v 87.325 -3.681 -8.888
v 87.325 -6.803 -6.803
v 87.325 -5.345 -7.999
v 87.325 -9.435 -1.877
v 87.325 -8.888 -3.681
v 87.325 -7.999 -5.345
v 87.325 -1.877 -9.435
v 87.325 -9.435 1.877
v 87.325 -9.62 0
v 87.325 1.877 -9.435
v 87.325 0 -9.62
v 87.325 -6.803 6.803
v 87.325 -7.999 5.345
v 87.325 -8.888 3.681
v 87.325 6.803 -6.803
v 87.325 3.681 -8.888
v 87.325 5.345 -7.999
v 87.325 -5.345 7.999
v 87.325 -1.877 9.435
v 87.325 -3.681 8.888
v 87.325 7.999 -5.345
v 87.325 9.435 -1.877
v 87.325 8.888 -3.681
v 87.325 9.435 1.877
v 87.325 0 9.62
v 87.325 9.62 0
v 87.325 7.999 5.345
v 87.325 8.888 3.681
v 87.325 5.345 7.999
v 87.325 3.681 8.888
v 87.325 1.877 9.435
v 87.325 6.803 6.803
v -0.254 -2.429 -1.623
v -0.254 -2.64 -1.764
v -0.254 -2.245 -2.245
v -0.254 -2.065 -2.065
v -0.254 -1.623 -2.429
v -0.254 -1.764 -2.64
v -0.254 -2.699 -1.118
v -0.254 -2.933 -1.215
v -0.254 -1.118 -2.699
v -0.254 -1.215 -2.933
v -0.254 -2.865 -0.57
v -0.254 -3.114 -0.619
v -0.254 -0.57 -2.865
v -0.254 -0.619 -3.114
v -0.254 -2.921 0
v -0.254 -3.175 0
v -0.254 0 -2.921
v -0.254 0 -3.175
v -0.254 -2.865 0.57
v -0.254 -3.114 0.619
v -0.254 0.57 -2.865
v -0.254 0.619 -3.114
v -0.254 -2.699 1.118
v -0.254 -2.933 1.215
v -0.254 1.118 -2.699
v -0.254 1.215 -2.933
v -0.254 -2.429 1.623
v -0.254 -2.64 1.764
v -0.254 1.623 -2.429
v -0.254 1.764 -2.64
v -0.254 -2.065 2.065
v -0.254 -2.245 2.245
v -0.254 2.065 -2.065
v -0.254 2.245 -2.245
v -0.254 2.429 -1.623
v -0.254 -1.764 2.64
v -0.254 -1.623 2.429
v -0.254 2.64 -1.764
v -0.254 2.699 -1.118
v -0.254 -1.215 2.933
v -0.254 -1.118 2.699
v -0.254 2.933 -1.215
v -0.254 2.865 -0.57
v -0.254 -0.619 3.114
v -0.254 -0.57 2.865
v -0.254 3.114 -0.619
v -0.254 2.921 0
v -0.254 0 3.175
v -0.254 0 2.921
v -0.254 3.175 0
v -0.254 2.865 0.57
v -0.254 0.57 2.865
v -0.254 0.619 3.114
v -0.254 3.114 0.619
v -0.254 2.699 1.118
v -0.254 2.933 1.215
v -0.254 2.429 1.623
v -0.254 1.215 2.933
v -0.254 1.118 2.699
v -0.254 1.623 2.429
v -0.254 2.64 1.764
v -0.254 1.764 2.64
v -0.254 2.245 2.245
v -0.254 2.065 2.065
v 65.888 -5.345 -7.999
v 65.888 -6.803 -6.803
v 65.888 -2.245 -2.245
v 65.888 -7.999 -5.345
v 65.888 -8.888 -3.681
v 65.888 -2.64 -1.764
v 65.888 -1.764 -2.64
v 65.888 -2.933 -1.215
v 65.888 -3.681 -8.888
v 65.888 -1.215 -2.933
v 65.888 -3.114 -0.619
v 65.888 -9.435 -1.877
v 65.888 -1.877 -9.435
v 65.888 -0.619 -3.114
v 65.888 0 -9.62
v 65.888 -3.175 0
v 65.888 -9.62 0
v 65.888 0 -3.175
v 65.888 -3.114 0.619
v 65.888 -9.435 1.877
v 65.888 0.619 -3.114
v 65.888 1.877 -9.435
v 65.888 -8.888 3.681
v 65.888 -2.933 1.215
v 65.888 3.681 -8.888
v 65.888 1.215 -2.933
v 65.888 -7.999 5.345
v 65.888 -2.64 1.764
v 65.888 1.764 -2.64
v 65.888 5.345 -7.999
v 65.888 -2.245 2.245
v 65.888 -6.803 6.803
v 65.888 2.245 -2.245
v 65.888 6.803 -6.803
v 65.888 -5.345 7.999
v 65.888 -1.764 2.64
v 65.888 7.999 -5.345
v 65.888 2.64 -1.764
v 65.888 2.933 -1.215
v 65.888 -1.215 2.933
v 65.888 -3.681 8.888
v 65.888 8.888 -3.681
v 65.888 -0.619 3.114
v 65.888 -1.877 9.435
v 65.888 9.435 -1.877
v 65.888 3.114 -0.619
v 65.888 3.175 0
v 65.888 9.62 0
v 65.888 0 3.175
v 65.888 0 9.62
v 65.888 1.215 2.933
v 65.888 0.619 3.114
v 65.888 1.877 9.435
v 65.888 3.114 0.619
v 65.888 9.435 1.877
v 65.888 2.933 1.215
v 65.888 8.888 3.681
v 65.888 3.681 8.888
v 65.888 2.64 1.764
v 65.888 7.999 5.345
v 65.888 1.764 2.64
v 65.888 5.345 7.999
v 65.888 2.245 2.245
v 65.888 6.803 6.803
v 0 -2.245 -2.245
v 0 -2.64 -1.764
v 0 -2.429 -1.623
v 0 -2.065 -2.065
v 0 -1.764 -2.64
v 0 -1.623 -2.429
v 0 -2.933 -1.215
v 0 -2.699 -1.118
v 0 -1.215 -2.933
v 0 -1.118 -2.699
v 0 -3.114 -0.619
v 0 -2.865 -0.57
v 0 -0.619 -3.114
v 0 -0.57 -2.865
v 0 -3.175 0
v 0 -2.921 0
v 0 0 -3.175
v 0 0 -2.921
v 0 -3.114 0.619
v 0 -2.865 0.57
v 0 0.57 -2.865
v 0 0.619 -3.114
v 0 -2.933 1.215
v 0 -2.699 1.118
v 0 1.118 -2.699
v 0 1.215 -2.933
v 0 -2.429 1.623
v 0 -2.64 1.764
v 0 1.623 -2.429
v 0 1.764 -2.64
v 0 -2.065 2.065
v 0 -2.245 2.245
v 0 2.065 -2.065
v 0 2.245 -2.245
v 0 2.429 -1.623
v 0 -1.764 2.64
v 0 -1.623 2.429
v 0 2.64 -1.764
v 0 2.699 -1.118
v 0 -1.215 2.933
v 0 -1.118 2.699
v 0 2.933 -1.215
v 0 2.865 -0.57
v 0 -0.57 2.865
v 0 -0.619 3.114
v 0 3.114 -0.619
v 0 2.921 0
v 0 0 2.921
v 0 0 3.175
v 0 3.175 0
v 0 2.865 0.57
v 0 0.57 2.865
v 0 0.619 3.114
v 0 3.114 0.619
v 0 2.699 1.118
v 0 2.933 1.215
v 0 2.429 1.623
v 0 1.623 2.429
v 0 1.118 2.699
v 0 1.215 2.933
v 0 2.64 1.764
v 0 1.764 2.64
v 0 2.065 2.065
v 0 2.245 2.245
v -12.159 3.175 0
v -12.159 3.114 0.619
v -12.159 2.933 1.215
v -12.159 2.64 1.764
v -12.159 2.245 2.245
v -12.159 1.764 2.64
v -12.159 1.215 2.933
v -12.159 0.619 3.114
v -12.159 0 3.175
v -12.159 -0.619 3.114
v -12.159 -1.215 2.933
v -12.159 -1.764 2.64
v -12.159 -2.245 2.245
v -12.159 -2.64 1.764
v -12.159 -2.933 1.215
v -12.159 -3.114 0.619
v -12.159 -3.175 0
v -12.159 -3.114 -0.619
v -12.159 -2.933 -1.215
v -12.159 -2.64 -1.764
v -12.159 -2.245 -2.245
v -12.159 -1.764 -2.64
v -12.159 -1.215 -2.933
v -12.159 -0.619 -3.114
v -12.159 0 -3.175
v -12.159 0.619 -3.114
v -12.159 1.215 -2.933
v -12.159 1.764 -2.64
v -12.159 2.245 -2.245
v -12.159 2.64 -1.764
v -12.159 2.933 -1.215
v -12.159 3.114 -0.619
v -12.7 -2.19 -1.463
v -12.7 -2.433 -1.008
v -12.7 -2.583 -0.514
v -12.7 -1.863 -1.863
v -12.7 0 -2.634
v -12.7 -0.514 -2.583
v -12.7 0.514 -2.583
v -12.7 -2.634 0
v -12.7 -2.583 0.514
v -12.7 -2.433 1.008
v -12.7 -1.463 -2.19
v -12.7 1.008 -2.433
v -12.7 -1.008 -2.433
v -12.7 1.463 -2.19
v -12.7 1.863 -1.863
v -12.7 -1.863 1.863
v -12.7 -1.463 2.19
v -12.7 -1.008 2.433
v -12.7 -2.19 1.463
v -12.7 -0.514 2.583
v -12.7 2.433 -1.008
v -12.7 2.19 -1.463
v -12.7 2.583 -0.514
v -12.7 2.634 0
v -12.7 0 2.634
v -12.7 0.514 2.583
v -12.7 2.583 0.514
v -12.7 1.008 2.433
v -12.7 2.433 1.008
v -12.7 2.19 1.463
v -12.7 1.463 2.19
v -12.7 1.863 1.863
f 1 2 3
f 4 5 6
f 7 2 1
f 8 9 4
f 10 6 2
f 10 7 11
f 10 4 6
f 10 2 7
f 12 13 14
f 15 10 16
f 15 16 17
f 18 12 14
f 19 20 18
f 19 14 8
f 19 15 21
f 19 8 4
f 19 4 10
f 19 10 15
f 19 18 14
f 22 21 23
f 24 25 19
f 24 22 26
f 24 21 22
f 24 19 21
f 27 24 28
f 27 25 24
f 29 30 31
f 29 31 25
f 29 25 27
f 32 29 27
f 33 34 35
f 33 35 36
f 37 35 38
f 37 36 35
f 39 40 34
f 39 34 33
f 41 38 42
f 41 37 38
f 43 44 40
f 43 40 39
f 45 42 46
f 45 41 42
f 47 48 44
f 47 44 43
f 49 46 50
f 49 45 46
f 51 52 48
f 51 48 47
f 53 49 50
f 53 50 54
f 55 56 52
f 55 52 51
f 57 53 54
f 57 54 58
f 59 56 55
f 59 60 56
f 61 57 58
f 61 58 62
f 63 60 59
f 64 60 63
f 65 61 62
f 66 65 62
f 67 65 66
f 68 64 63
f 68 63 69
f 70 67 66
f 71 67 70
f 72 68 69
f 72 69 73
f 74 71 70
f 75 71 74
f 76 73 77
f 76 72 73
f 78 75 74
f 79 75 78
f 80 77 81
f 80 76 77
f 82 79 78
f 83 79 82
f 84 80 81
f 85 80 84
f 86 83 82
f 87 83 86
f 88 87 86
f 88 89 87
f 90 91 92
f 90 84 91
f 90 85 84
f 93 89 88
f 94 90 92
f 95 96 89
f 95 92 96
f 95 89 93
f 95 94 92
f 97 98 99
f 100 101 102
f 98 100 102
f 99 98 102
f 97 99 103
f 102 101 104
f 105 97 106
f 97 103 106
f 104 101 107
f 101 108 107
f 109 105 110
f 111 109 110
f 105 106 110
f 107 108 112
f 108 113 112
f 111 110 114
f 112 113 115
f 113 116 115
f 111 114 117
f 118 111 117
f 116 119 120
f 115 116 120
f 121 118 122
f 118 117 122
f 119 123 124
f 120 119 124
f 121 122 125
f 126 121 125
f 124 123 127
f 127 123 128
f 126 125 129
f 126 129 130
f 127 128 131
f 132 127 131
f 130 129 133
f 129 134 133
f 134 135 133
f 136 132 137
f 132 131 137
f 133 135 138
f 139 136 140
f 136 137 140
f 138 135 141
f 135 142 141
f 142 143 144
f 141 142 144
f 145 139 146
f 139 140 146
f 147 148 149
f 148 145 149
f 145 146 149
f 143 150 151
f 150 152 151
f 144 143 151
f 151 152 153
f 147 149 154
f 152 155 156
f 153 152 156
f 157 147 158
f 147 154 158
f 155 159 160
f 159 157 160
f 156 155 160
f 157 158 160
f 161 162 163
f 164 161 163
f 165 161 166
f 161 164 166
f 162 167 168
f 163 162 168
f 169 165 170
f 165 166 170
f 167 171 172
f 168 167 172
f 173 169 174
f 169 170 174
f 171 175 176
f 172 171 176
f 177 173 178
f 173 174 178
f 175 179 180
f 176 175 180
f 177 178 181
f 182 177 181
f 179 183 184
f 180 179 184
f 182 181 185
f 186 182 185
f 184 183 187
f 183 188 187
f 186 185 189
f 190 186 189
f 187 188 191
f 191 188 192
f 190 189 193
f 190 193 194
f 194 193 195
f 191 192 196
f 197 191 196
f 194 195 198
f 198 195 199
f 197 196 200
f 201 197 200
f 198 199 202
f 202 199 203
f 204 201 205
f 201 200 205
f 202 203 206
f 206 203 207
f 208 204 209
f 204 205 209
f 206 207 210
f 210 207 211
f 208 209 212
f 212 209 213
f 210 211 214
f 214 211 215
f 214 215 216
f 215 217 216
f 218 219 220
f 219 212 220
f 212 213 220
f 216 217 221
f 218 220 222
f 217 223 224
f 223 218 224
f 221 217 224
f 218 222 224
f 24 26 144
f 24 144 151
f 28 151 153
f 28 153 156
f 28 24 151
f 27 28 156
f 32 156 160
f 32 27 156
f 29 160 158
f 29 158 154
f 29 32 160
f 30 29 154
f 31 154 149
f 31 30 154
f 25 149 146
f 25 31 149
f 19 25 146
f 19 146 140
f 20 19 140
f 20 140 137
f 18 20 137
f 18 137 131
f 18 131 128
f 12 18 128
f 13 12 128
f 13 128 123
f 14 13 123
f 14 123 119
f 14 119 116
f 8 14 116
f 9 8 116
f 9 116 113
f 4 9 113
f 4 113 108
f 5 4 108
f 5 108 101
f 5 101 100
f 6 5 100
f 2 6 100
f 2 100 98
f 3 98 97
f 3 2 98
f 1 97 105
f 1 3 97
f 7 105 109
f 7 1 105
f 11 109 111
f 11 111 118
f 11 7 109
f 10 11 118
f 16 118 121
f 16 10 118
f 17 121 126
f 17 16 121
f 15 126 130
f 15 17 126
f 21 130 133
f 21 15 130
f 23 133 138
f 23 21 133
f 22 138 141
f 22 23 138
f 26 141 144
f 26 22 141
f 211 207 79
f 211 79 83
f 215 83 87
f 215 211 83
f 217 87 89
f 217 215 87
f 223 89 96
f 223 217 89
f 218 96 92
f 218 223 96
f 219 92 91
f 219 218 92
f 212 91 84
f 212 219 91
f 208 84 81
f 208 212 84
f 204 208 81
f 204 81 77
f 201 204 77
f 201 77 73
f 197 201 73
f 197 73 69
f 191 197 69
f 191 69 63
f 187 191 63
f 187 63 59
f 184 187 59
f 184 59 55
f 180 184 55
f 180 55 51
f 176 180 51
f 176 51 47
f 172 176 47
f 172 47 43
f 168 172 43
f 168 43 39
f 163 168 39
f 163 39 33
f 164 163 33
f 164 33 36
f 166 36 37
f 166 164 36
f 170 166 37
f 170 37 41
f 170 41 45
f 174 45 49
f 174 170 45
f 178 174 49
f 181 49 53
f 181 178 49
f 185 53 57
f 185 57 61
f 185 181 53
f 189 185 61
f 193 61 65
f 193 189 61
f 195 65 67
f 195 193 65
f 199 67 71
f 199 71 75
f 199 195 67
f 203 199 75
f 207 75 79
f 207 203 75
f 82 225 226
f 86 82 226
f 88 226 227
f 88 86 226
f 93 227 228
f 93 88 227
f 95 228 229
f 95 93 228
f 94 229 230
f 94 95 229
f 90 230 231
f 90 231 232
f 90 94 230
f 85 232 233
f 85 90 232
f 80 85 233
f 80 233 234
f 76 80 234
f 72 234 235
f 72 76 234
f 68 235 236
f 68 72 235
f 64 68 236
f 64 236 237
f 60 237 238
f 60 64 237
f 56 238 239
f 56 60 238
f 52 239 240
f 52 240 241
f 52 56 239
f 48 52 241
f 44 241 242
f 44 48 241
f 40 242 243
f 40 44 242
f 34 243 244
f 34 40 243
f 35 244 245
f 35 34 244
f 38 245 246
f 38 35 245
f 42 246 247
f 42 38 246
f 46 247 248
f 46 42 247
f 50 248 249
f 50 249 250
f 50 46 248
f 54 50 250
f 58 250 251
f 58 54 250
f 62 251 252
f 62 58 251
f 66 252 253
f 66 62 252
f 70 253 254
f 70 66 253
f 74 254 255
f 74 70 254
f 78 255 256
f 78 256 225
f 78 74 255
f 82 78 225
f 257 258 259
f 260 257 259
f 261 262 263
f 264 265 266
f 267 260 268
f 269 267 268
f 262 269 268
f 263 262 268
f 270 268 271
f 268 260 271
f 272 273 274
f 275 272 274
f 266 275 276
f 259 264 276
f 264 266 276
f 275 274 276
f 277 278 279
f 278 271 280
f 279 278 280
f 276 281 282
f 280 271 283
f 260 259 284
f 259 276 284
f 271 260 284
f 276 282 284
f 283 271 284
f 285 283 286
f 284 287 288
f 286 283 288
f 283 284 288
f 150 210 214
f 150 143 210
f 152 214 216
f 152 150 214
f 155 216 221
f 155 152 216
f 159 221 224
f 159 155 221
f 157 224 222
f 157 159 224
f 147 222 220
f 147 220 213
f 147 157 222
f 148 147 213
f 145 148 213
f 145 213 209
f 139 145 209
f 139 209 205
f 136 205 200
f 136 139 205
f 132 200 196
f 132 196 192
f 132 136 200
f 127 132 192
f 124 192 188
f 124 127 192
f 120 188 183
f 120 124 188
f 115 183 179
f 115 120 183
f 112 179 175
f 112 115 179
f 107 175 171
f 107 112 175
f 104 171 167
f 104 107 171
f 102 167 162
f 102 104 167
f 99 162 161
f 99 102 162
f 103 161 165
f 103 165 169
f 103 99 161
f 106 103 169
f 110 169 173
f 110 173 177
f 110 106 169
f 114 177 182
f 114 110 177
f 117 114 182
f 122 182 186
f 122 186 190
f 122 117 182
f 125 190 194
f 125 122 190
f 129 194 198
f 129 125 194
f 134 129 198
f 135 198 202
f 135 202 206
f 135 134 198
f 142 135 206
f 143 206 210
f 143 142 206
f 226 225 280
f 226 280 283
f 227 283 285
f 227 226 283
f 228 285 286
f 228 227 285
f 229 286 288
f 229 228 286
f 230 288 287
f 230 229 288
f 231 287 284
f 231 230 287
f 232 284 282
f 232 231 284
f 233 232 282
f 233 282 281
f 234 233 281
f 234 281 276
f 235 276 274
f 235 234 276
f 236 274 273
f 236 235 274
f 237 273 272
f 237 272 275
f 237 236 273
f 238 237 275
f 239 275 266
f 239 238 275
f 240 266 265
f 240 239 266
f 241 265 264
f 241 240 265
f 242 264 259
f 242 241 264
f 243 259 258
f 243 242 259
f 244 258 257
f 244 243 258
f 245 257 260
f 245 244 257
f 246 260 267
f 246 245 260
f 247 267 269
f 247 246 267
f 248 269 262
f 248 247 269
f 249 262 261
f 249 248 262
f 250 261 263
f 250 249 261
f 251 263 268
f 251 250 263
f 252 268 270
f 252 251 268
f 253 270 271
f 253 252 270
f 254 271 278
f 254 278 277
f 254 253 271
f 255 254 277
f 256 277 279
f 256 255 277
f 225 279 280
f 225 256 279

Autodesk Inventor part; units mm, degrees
sketch "Sketch_1" plane through (0, 0, 0) normal (0, 0, 1) x (1, 0, 0)
  line L0 (87.3252, 0) -> (0, 0)
  line L1 (0, 0) -> (0, 3.175)
  line L2 (0, 3.175) -> (65.8876, 3.175)
  line L3 (65.8876, 3.175) -> (65.8876, 9.6202)
  line L4 (65.8876, 9.6202) -> (87.3252, 9.6202)
  line L5 (87.3252, 9.6202) -> (87.3252, 0)
  line L6 (87.3252, 0) -> (0, 0)
revolve "Revolution1" add sketch "Sketch_1" angle 360 about axis through (87.3252, 0, 0) along (1, 0, 0)
sketch "Sketch_3" plane through (0, 0, 0) normal (0, 0, 1) x (1, 0, 0)
  line L0 (0, 0) -> (-12.7, 0)
  line L1 (-12.7, 0) -> (-12.7, 2.634)
  line L2 (-12.7, 2.634) -> (-12.159, 3.175)
  line L3 (-12.159, 3.175) -> (0, 3.175)
  line L4 (0, 3.175) -> (0, 0)
  line L5 (0, 0) -> (-12.7, 0)
revolve "Revolution2" add sketch "Sketch_3" angle 360 about axis through (0, 0, 0) along (1, 0, 0)
sketch "Sketch_30" plane through (0, 0, 0) normal (0, 0, 1) x (1, 0, 0)
  line L0 (0, 0) -> (-0.254, 0)
  line L1 (-0.254, 2.921) -> (0, 2.921)
  line L2 (0, 2.921) -> (0, 3.429)
  line L3 (0, 3.429) -> (-0.254, 3.429)
  line L4 (-0.254, 3.429) -> (-0.254, 2.921)
revolve "Revolution3" cut sketch "Sketch_30" angle 360 about axis through (0, 0, 0) along (1, 0, 0)
ref_plane "dia1_XY" through (0, 3.175, 0) normal (1, 0, 0) x (0, 0, -1)
ref_plane "dia1_YZ" through (0, 3.175, 0) normal (0, 0, -1) x (0, 1, 0)
ref_plane "dia1_ZX" through (0, 3.175, 0) normal (0, 1, 0) x (1, 0, 0)
ref_plane "dia12_XY" through (0, 0, 10.9537) normal (1, 0, 0) x (0, 0, -1)
ref_plane "dia12_YZ" through (0, 0, 10.9537) normal (0, 0, -1) x (0, 1, 0)
ref_plane "dia12_ZX" through (0, 0, 10.9537) normal (0, 1, 0) x (1, 0, 0)
ref_plane "dia2_XY" through (0, -3.175, 0) normal (1, 0, 0) x (0, 0, -1)
ref_plane "dia2_YZ" through (0, -3.175, 0) normal (0, 0, -1) x (0, 1, 0)
ref_plane "dia2_ZX" through (0, -3.175, 0) normal (0, 1, 0) x (1, 0, 0)
ref_plane "dia22_XY" through (0, 0, -10.9537) normal (1, 0, 0) x (0, 0, -1)
ref_plane "dia22_YZ" through (0, 0, -10.9537) normal (0, 0, -1) x (0, 1, 0)
ref_plane "dia22_ZX" through (0, 0, -10.9537) normal (0, 1, 0) x (1, 0, 0)
ref_plane "rl1_XY" through (-12.7, 0, 0) normal (1, 0, 0) x (0, 0, -1)
ref_plane "rl1_YZ" through (-12.7, 0, 0) normal (0, 0, -1) x (0, 1, 0)
ref_plane "rl1_ZX" through (-12.7, 0, 0) normal (0, 1, 0) x (1, 0, 0)
ref_plane "rl2_XY" through (0, 0, 0) normal (1, 0, 0) x (0, 0, -1)
ref_plane "rl2_YZ" through (0, 0, 0) normal (0, 0, -1) x (0, 1, 0)
ref_plane "rl2_ZX" through (0, 0, 0) normal (0, 1, 0) x (1, 0, 0)
ref_plane "rod_cp_XY" through (0, 0, 0) normal (1, 0, 0) x (0, 0, -1)
ref_plane "rod_cp_YZ" through (0, 0, 0) normal (0, 0, -1) x (0, 1, 0)
ref_plane "rod_cp_ZX" through (0, 0, 0) normal (0, 1, 0) x (1, 0, 0)
ref_plane "thd1_XY" through (-12.7, 3.175, 0) normal (1, 0, 0) x (0, 0, -1)
ref_plane "thd1_YZ" through (-12.7, 3.175, 0) normal (0, 0, -1) x (0, 1, 0)
ref_plane "thd1_ZX" through (-12.7, 3.175, 0) normal (0, 1, 0) x (1, 0, 0)
ref_plane "thd2_XY" through (-12.7, -3.175, 0) normal (1, 0, 0) x (0, 0, -1)
ref_plane "thd2_YZ" through (-12.7, -3.175, 0) normal (0, 0, -1) x (0, 1, 0)
ref_plane "thd2_ZX" through (-12.7, -3.175, 0) normal (0, 1, 0) x (1, 0, 0)
ref_plane "to_rod_clevis_XY" through (-16.764, 0, 0) normal (1, 0, 0) x (0, 0, -1)
ref_plane "to_rod_clevis_YZ" through (-16.764, 0, 0) normal (0, 0, -1) x (0, 1, 0)
ref_plane "to_rod_clevis_ZX" through (-16.764, 0, 0) normal (0, 1, 0) x (1, 0, 0)
properties part number "C-041-DP0000_rod"
